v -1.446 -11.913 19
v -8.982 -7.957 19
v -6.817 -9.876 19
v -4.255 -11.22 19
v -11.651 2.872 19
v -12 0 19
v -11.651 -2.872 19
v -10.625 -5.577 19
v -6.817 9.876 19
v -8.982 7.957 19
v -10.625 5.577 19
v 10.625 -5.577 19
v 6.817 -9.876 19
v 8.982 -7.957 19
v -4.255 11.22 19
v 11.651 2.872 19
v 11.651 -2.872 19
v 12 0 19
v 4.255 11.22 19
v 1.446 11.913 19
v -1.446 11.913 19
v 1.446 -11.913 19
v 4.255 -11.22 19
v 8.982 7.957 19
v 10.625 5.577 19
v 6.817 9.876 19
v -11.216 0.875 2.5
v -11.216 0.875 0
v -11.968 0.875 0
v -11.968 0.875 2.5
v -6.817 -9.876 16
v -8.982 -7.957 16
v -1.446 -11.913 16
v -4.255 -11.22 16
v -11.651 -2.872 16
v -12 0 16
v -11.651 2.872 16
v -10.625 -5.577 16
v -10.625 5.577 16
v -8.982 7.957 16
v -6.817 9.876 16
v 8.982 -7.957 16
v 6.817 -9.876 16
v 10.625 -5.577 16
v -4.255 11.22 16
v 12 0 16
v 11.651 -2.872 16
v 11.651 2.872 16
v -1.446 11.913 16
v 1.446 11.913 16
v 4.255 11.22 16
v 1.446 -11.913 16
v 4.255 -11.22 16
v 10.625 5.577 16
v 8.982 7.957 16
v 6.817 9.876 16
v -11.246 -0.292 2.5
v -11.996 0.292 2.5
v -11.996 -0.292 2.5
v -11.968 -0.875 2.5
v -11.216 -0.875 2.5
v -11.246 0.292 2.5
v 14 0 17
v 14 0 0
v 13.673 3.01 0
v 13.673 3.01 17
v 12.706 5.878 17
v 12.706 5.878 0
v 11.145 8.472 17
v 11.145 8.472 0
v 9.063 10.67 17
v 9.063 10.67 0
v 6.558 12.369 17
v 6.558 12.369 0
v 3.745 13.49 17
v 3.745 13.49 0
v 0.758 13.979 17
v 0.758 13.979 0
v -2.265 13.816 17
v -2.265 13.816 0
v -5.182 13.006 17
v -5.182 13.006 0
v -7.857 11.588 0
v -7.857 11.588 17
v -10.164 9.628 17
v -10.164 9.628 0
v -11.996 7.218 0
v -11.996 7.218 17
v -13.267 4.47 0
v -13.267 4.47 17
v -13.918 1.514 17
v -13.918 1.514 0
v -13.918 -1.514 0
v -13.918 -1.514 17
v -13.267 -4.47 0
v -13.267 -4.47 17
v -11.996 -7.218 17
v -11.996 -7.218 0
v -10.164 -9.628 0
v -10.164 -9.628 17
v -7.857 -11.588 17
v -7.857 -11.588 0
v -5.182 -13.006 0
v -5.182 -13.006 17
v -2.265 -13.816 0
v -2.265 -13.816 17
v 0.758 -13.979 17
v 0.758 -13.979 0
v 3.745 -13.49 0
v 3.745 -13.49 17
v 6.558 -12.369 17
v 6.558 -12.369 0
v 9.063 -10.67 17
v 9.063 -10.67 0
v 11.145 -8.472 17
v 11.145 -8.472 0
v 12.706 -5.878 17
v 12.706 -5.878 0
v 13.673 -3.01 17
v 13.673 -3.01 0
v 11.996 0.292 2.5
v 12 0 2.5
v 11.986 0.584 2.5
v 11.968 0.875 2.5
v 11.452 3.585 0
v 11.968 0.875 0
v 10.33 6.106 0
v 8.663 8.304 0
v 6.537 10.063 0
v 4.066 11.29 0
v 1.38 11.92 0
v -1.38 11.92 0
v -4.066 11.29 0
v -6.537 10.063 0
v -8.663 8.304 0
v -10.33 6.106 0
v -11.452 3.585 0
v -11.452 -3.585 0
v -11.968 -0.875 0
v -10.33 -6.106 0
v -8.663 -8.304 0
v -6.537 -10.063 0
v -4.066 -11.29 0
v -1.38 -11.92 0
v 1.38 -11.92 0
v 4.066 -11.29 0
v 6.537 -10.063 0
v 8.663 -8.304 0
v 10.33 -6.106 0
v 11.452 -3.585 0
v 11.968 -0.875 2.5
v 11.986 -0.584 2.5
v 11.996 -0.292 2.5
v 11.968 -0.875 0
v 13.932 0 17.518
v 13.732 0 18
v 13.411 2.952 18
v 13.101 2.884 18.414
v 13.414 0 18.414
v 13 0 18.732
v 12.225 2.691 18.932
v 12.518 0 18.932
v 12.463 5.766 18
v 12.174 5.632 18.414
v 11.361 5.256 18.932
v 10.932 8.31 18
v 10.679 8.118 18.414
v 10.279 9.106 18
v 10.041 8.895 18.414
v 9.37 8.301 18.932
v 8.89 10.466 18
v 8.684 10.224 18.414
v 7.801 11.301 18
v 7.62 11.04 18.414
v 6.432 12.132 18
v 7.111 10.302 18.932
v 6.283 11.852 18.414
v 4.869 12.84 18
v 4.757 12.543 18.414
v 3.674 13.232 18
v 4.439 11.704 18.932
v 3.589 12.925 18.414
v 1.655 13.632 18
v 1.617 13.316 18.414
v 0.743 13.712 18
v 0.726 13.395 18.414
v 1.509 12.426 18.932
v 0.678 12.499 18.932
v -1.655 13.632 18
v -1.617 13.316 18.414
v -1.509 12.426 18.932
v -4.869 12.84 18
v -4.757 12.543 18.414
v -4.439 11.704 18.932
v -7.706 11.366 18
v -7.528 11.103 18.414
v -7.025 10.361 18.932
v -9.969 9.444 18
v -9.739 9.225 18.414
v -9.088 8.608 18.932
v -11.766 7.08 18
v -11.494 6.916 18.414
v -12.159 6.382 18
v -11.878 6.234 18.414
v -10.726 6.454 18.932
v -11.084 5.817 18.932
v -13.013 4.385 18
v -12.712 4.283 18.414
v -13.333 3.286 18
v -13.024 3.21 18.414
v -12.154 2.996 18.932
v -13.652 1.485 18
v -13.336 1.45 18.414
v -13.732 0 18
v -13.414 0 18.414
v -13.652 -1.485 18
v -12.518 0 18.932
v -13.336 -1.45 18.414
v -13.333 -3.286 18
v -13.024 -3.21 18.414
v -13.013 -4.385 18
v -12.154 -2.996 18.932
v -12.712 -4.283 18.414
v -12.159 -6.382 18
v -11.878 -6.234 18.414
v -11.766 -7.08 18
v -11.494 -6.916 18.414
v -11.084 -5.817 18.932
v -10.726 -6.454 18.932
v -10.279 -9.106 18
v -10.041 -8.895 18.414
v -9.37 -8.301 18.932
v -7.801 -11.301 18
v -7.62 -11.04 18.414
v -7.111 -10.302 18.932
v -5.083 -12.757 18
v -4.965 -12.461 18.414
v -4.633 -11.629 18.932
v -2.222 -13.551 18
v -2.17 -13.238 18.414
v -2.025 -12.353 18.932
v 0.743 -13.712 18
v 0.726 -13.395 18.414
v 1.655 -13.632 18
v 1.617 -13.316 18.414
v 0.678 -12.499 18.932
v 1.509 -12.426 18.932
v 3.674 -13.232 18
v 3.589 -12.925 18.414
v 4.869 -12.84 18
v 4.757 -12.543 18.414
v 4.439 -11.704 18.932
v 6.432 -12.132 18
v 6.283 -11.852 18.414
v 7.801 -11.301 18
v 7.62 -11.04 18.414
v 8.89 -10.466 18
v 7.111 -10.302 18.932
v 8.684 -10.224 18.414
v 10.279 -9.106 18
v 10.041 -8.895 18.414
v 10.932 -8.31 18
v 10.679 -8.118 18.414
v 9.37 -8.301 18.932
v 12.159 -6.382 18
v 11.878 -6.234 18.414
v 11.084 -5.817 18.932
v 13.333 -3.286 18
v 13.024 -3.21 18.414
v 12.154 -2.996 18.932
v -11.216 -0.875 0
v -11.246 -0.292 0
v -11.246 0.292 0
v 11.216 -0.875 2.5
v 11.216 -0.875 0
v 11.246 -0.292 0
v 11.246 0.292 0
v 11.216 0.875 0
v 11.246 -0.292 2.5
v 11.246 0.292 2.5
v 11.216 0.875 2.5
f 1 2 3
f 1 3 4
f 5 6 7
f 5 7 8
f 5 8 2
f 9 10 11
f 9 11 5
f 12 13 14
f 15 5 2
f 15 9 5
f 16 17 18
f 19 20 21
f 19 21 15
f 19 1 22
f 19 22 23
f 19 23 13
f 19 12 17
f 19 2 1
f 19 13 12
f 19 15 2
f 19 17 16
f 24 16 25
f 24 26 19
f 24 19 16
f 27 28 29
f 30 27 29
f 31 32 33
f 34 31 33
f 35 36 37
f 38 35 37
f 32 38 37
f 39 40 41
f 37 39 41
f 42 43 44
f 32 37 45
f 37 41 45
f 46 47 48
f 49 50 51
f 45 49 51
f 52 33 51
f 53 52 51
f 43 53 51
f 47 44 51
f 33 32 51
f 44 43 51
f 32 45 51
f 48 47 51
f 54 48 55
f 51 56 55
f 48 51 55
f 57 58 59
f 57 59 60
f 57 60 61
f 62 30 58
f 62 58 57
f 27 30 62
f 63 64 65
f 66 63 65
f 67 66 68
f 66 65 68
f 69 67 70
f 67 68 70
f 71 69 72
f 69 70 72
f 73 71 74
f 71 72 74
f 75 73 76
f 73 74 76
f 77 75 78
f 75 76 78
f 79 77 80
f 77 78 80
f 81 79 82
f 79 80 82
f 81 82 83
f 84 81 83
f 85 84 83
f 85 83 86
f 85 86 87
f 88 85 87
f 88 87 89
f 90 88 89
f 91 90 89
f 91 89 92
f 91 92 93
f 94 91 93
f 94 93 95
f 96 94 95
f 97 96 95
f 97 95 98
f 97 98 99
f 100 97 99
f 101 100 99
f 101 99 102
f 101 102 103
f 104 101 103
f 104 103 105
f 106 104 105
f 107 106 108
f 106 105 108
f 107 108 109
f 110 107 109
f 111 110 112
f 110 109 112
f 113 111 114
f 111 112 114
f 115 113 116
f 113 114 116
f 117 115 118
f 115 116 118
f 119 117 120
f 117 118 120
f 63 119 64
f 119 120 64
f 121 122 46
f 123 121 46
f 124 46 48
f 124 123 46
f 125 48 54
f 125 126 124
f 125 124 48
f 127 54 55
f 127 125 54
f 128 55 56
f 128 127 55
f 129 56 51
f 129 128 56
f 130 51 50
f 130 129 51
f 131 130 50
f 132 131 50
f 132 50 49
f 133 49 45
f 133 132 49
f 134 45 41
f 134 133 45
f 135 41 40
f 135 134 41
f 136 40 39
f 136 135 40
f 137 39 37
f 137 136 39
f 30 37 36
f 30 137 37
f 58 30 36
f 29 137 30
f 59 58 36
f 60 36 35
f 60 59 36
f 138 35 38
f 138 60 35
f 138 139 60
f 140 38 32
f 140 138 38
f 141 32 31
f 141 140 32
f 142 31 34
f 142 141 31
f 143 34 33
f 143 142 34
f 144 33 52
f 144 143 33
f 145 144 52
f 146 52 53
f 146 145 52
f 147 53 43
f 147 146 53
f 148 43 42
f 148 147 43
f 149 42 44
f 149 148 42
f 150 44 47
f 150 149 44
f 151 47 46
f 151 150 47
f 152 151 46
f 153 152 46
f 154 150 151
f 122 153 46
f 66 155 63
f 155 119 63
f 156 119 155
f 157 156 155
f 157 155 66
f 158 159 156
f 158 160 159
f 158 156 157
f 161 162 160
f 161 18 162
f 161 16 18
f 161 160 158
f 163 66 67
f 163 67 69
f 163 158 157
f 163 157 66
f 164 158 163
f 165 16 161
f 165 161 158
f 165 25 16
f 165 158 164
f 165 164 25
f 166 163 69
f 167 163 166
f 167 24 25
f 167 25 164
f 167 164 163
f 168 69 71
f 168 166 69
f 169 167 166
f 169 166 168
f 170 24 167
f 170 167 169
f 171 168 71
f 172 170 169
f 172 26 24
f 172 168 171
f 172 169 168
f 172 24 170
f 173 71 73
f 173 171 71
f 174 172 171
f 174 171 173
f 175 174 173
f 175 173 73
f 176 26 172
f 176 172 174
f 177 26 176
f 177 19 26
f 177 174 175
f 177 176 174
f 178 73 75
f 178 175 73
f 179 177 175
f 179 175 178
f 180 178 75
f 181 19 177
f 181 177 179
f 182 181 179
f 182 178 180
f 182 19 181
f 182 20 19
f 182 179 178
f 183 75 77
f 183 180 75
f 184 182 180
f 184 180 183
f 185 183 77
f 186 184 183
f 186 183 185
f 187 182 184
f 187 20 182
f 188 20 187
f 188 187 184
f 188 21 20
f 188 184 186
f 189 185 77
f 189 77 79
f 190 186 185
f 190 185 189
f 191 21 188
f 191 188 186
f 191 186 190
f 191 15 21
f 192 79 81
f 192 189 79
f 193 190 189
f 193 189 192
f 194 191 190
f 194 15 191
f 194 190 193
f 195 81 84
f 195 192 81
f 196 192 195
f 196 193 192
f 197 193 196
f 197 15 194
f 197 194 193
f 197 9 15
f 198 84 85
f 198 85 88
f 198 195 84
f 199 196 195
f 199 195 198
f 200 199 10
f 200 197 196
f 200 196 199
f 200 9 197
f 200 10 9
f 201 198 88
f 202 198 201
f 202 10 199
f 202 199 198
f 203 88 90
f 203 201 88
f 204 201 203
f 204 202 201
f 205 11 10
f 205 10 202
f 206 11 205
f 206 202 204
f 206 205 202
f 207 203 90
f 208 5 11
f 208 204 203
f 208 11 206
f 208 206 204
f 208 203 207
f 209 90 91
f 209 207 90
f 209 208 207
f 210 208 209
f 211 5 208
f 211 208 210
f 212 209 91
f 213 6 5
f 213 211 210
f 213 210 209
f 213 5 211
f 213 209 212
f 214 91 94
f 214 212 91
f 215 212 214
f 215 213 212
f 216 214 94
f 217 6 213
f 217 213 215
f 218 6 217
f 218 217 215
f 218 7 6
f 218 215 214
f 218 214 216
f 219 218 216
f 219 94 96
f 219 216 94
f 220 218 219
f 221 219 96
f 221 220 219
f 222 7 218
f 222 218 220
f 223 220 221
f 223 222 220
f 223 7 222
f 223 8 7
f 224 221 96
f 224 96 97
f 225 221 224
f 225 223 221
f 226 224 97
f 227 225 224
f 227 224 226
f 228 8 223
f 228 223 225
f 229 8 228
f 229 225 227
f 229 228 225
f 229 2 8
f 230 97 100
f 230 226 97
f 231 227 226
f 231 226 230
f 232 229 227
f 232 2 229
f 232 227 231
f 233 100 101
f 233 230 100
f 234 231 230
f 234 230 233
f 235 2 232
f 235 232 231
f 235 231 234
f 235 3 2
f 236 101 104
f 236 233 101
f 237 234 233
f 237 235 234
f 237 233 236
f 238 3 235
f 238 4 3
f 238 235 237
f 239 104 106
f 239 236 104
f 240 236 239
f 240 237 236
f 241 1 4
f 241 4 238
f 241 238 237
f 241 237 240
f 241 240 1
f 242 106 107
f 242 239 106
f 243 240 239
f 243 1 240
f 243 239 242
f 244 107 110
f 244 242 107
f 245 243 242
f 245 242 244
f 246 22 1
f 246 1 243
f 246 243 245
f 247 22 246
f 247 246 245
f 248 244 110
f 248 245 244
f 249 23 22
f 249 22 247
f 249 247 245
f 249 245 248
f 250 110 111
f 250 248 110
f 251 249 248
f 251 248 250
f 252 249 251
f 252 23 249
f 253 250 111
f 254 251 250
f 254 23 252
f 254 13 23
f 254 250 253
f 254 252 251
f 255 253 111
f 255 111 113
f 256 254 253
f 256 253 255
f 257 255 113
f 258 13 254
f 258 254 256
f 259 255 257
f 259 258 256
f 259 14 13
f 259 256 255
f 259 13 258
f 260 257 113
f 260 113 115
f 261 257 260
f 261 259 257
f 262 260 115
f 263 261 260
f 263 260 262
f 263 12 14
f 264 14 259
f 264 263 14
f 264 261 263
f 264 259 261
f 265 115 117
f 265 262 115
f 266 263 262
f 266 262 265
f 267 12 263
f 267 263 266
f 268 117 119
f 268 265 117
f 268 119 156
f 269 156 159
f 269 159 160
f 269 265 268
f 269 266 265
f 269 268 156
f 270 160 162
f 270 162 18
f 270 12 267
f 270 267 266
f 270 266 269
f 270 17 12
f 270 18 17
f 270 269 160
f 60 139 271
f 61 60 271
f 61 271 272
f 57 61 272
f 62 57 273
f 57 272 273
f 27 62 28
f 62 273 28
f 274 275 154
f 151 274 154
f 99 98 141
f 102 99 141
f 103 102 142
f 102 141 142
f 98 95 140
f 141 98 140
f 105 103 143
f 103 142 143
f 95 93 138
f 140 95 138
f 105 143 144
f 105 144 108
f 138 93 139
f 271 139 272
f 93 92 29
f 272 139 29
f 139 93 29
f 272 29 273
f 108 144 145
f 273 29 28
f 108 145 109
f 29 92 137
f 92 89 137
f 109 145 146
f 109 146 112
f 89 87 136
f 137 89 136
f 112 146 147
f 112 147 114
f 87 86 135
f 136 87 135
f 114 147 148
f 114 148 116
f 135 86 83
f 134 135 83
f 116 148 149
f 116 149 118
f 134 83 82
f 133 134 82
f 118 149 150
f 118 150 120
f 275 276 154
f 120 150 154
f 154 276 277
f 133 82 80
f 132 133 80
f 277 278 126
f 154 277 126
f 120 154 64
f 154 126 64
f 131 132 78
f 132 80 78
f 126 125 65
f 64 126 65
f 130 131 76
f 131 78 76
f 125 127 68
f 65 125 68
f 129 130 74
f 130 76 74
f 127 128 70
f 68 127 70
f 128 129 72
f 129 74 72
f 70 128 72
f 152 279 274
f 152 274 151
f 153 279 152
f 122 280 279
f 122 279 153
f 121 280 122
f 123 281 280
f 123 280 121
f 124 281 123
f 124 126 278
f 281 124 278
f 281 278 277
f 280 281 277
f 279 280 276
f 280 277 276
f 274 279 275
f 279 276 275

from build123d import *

# Parameters (mm, degrees)
F0_R     = 14
F0_R_2   = 12
F1_DEPTH = 16
F3_DEPTH = 2.5
F4_R     = 14
F5_DEPTH = 3
F6_R     = 2


with BuildPart() as f1:
    # F0 (on Top) → F1 (new body)
    with BuildSketch(Plane.XY):
        Circle(F0_R)
        Circle(F0_R_2, mode=Mode.SUBTRACT)
    extrude(amount=F1_DEPTH)

    # F2 (on Top) → F3 (join)
    with BuildSketch(Plane.XY):
        with BuildLine():
            Line((-11.2159206042, 0.875), (-11.968056442, 0.875))
            ThreePointArc((-11.968056442, 0.875), (-12, 0), (-11.968056442, -0.875))
            Line((-11.968056442, -0.875), (-11.2159206042, -0.875))
            ThreePointArc((-11.2159206042, -0.875), (-11.25, 0), (-11.2159206042, 0.875))
        make_face()
        with BuildLine():
            ThreePointArc((11.968056442, -0.875), (12, 0), (11.968056442, 0.875))
            Line((11.968056442, 0.875), (11.2159206042, 0.875))
            ThreePointArc((11.2159206042, 0.875), (11.25, 0), (11.2159206042, -0.875))
            Line((11.2159206042, -0.875), (11.968056442, -0.875))
        make_face()
    extrude(amount=F3_DEPTH)

    # F4 (on face) → F5 (join)
    with BuildSketch(Plane.XY.offset(16)):
        Circle(F4_R)
    extrude(amount=F5_DEPTH)

    # F6
    f6_edges = [f1.edges().sort_by_distance(p)[0] for p in [
        (-14, 0, 19),
    ]]
    fillet(f6_edges, radius=F6_R)


solid = f1.part
